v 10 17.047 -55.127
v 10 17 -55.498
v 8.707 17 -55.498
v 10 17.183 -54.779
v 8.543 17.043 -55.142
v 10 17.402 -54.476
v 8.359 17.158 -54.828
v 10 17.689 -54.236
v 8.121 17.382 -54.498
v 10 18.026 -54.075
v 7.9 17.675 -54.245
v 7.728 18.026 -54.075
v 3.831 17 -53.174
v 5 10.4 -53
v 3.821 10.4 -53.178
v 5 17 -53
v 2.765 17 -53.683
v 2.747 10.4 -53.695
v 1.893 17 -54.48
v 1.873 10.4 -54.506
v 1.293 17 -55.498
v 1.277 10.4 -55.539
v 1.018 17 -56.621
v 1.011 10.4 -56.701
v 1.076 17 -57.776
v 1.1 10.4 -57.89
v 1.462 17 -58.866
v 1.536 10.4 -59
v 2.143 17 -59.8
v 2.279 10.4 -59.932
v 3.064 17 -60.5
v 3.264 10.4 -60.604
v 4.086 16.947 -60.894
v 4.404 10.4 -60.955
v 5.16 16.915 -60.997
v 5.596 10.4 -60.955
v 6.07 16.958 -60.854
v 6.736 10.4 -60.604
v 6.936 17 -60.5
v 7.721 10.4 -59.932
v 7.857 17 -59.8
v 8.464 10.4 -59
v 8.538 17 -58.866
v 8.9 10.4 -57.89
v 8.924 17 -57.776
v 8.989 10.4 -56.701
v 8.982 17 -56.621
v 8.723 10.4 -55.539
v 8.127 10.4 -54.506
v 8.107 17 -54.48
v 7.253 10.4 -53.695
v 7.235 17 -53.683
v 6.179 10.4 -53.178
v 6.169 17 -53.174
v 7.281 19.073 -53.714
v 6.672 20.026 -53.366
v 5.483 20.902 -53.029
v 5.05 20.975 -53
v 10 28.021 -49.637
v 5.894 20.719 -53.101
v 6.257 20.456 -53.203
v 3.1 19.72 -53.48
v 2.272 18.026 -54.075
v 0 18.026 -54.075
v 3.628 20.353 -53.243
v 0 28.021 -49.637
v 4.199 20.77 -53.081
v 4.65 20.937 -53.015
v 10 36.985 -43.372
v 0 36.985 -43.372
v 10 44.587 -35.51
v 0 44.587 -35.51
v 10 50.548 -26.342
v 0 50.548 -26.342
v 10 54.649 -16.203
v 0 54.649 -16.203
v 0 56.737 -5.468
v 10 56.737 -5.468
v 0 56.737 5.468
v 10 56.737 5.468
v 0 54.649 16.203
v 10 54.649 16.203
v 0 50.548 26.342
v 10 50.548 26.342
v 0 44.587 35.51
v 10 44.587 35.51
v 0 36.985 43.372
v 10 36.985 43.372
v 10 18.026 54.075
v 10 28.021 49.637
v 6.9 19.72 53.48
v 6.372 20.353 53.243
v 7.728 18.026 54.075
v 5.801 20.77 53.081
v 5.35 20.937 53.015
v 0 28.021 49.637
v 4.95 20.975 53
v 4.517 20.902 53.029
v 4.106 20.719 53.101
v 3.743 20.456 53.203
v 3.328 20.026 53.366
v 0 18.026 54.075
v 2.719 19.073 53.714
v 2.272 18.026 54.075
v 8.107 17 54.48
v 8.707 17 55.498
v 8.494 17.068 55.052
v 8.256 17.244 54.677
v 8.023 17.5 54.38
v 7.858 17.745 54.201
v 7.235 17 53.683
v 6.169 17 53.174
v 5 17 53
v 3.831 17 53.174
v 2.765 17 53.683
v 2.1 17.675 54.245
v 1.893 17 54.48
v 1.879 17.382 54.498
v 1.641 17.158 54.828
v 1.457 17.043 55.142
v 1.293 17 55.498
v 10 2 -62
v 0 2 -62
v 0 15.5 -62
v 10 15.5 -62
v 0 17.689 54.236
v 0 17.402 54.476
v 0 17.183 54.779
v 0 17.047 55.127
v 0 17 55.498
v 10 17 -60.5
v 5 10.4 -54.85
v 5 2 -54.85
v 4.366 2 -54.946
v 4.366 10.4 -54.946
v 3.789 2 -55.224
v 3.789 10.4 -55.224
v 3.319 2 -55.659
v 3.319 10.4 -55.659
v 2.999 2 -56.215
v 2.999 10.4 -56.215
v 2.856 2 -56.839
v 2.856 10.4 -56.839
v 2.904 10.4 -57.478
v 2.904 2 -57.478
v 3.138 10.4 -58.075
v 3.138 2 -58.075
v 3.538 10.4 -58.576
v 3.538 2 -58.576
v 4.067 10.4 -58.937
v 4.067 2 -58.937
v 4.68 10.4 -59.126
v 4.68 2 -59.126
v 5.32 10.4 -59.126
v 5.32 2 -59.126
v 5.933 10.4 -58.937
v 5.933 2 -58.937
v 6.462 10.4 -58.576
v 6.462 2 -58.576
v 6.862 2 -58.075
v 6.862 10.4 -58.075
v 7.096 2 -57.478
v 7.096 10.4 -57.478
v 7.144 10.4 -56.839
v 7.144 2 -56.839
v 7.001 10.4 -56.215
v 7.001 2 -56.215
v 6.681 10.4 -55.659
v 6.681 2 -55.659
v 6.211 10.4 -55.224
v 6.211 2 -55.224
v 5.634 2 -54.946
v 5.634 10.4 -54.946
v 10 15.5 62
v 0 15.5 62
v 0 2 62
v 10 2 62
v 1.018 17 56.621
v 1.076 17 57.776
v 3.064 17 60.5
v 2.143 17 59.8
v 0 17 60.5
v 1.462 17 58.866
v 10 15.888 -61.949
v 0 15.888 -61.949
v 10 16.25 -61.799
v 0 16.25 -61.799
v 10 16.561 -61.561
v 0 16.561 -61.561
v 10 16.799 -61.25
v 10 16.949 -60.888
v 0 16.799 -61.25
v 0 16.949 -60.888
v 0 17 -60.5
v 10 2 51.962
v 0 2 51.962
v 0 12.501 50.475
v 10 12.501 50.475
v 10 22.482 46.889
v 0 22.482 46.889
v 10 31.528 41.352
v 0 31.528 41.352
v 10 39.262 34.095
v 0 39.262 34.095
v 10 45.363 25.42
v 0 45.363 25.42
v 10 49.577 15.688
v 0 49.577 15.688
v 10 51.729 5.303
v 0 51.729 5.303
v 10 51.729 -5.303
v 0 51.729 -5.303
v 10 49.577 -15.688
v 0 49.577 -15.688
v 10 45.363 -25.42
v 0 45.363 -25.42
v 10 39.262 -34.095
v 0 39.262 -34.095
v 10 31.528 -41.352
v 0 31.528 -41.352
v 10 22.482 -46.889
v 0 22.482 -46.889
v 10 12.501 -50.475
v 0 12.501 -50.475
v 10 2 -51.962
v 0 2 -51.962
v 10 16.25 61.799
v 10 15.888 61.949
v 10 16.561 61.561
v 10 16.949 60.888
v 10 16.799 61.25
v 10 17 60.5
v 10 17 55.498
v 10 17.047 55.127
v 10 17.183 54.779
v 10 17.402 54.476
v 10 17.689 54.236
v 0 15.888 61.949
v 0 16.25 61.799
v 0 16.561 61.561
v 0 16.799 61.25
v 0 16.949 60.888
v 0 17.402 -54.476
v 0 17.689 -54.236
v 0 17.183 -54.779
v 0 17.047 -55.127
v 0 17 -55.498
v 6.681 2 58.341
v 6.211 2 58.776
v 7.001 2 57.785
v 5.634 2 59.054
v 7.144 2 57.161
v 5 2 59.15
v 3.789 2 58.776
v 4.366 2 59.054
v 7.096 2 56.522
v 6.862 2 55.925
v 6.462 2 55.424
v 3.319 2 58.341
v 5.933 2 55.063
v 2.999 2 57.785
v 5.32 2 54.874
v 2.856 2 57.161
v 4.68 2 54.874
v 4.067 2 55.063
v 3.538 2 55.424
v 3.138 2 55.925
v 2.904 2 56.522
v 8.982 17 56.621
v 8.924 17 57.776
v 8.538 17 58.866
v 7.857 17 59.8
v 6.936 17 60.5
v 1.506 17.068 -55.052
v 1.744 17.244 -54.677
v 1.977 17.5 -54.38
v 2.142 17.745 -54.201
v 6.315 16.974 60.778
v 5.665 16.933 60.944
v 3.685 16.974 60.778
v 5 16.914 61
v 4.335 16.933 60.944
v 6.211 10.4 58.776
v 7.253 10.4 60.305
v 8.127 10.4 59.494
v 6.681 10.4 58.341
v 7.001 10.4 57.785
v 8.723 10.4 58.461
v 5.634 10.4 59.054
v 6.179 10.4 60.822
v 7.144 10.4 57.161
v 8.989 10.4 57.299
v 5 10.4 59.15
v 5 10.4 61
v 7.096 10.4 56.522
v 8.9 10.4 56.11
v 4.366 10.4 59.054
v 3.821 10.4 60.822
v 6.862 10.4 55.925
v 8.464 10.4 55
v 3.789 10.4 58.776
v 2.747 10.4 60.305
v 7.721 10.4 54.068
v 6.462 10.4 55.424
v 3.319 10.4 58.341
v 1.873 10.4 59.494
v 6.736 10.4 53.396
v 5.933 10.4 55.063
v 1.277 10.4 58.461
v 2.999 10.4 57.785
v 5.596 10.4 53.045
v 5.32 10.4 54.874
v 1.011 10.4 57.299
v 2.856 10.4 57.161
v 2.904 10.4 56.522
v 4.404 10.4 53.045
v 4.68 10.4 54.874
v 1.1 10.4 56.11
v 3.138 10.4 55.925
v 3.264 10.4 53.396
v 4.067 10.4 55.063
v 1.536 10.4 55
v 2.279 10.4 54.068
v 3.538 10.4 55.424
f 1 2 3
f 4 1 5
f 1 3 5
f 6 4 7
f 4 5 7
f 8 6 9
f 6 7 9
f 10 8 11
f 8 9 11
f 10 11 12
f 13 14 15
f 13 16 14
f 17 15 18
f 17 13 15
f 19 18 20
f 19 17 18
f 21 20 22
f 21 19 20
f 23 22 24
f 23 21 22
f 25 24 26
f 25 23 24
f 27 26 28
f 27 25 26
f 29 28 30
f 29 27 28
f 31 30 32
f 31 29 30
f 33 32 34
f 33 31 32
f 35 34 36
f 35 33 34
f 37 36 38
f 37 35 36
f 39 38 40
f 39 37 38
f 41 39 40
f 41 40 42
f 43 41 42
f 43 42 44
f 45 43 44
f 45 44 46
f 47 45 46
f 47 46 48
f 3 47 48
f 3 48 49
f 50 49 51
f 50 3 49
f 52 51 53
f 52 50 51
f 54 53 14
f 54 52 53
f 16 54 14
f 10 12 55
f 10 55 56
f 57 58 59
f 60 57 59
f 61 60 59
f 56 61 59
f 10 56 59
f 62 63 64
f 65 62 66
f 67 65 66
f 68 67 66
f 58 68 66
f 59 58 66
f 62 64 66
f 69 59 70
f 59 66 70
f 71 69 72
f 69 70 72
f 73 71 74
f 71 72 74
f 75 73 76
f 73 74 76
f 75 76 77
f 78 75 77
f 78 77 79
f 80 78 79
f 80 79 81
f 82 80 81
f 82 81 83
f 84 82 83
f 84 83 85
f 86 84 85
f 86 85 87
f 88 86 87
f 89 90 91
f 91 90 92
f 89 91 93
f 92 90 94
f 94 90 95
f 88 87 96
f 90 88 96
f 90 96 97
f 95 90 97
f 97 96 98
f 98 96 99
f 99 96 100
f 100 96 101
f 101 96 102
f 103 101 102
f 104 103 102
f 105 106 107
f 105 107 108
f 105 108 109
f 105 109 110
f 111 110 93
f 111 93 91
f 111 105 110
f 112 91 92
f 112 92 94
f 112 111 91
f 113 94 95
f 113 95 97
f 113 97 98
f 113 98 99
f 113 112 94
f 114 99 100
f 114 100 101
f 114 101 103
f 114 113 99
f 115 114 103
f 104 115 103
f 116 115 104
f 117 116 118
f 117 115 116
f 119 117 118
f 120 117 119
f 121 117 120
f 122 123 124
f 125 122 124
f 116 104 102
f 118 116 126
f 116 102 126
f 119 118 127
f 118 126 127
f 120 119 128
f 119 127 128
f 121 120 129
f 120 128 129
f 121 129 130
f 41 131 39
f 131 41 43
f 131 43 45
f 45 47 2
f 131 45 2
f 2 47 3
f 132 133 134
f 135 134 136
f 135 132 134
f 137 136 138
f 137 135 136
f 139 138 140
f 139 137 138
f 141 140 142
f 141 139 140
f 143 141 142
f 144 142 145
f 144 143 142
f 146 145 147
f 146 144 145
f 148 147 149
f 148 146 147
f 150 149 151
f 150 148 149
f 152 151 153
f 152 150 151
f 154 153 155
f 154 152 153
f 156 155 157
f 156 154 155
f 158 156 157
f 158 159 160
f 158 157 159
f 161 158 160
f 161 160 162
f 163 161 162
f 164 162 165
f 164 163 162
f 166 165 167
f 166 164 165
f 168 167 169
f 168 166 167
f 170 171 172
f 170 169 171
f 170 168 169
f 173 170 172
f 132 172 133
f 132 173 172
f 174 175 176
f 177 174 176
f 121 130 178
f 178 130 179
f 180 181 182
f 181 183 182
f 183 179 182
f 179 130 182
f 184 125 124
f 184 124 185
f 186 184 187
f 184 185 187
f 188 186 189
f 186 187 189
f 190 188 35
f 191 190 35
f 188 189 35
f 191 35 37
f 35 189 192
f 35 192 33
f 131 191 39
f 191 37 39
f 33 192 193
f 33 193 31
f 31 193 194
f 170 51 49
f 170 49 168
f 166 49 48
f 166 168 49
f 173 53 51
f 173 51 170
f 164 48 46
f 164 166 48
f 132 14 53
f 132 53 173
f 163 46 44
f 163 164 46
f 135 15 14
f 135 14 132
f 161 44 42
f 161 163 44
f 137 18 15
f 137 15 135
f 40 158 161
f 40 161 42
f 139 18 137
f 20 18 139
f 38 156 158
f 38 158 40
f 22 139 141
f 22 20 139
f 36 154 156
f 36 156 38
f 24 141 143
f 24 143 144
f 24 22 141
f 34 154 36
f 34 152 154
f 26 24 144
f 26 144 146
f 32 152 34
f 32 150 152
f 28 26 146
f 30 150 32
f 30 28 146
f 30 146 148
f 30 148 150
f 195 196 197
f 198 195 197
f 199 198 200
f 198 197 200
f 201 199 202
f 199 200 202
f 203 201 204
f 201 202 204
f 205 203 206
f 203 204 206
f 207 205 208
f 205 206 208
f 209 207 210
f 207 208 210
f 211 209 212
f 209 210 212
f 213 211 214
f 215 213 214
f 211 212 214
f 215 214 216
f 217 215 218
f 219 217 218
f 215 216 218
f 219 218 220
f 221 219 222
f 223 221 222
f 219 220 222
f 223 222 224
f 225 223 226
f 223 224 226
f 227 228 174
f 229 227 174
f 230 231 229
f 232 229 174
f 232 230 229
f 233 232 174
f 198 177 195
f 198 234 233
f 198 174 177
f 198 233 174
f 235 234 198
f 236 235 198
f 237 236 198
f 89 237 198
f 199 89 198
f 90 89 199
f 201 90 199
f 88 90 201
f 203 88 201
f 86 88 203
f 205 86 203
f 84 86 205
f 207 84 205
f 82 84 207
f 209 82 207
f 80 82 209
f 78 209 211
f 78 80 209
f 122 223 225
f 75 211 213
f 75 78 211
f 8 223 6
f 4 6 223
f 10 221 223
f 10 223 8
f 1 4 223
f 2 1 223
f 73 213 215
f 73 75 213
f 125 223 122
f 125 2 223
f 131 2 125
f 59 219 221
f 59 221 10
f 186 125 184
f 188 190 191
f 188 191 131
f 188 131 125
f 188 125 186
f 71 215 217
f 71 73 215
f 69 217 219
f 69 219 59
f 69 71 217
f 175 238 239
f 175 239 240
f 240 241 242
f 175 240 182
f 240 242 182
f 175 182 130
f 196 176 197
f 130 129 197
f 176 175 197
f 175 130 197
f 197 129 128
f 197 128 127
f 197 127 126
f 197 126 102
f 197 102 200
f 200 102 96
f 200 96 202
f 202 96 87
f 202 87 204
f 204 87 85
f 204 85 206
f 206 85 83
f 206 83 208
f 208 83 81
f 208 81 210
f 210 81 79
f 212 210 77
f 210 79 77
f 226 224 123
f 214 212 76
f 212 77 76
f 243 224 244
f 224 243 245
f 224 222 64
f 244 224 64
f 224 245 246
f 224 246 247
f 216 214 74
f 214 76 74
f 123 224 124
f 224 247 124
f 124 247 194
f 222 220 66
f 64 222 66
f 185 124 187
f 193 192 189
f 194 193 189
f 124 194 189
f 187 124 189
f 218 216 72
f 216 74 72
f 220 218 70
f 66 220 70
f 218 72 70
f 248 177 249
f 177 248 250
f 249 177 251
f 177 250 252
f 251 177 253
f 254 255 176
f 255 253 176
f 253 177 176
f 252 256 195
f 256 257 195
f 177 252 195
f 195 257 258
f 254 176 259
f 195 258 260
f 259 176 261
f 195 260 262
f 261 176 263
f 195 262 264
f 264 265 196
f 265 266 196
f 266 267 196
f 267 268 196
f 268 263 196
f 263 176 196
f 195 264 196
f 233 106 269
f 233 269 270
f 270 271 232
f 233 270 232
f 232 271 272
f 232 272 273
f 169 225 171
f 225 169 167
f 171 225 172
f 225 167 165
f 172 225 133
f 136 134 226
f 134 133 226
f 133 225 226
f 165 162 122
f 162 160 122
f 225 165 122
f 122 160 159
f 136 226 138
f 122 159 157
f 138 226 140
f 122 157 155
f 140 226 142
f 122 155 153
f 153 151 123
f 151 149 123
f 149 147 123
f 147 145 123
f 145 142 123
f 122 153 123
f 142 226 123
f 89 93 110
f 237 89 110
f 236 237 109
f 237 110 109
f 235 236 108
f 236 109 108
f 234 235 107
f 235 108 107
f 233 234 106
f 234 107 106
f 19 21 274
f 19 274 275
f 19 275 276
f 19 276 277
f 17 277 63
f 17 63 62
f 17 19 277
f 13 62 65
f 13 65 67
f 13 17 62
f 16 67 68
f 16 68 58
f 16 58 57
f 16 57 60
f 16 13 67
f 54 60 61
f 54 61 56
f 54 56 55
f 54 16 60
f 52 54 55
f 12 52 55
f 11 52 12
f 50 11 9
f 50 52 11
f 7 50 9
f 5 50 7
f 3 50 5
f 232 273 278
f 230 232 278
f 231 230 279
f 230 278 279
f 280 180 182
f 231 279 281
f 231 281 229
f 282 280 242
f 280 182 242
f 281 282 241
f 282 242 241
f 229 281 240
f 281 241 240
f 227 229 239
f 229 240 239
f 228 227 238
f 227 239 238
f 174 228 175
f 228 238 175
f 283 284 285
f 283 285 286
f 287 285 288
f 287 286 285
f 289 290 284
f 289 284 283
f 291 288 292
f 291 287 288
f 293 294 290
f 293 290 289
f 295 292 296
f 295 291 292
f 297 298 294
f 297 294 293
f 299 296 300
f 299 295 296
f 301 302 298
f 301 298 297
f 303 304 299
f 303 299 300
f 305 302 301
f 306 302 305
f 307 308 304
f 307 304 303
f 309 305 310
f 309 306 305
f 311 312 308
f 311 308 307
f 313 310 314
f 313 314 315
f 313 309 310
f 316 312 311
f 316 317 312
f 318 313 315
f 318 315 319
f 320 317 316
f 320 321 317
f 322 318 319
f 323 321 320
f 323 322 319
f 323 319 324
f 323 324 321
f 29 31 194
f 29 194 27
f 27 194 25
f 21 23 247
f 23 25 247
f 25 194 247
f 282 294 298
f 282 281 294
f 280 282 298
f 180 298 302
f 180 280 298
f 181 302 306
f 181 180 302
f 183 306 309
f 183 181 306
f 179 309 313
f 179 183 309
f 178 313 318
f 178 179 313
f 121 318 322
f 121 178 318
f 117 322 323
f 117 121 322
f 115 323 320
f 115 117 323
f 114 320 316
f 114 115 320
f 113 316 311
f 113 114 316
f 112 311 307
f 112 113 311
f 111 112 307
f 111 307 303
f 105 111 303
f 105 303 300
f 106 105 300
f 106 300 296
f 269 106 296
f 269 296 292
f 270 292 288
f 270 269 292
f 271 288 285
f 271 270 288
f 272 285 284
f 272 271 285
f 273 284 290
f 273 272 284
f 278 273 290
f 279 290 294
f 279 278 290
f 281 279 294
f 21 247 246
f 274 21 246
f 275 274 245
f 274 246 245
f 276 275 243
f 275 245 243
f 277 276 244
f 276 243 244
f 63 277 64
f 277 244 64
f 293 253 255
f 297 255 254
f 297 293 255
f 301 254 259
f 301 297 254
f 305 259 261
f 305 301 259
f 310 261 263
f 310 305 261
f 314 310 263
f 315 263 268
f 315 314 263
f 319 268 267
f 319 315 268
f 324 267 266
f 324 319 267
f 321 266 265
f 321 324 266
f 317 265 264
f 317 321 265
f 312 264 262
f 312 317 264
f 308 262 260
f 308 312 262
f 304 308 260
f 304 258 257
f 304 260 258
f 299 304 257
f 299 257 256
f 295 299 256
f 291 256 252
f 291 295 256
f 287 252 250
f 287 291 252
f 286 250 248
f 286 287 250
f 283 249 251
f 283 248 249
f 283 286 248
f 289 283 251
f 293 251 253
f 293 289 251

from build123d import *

# Parameters (mm, degrees)
BOSS_EXTRUDE1_DEPTH                        = 10
CBORE_FOR_M4_CHEESE_HEAD_SCREW1_AT_2_COUNT = 2
CBORE_FOR_M4_CHEESE_HEAD_SCREW1_AT_2_PITCH = 114
SKETCH6_R                                  = 4
CUT_EXTRUDE1_DEPTH                         = 8


with BuildPart() as part:
    # Sketch1 → Boss-Extrude1 (new body)
    with BuildSketch(Plane(origin=(0, 0, 0), x_dir=(0, 0, -1), z_dir=(1, 0, 0))):
        with BuildLine():
            Line((-62, 2), (-51.961524227, 2))
            ThreePointArc((-51.961524227, 2), (0, 52), (51.961524227, 2))
            Line((51.961524227, 2), (62, 2))
            Line((62, 2), (62, 15.5))
            ThreePointArc((62, 15.5), (61.560660172, 16.560660172), (60.5, 17))
            Line((60.5, 17), (55.497747702, 17))
            ThreePointArc((55.497747702, 17), (54.620689683, 17.283131383), (54.07472853, 18.025641026))
            ThreePointArc((54.07472853, 18.025641026), (0, 57), (-54.07472853, 18.025641026))
            ThreePointArc((-54.07472853, 18.025641026), (-54.620689683, 17.283131383), (-55.497747702, 17))
            Line((-55.497747702, 17), (-60.5, 17))
            ThreePointArc((-60.5, 17), (-61.560660172, 16.560660172), (-62, 15.5))
            Line((-62, 15.5), (-62, 2))
        make_face()
    extrude(amount=BOSS_EXTRUDE1_DEPTH)

    # Sketch4 → CBORE for M4 Cheese Head Screw1 (revolve, cut)
    with BuildSketch(Plane(origin=(5, 17, -57), x_dir=(0, 0, 1), z_dir=(1, 0, 0))):
        Polygon((0, 0), (0, 21.291850331), (2.15, 20), (2.15, 6.6), (4, 6.6), (4, 0), align=None)
    cbore_for_m4_cheese_head_screw1 = revolve(axis=Axis((5, 23.35, -57), (0, -1, 0)), mode=Mode.SUBTRACT)

    # CBORE for M4 Cheese Head Screw1 at 2: CBORE for M4 Cheese Head Screw1 ×2
    with Locations(*[(0, 0, i * CBORE_FOR_M4_CHEESE_HEAD_SCREW1_AT_2_PITCH) for i in range(1, CBORE_FOR_M4_CHEESE_HEAD_SCREW1_AT_2_COUNT)]):
        add(cbore_for_m4_cheese_head_screw1, mode=Mode.SUBTRACT)

    # Sketch6 → Cut-Extrude1 (cut)
    with BuildSketch(Plane(origin=(0, 17, 0), x_dir=(1, 0, 0), z_dir=(0, 1, 0))):
        with Locations((5, 57)):
            Circle(SKETCH6_R)
        with Locations((5, -57)):
            Circle(SKETCH6_R)
    extrude(amount=CUT_EXTRUDE1_DEPTH, mode=Mode.SUBTRACT)


solid = part.part
